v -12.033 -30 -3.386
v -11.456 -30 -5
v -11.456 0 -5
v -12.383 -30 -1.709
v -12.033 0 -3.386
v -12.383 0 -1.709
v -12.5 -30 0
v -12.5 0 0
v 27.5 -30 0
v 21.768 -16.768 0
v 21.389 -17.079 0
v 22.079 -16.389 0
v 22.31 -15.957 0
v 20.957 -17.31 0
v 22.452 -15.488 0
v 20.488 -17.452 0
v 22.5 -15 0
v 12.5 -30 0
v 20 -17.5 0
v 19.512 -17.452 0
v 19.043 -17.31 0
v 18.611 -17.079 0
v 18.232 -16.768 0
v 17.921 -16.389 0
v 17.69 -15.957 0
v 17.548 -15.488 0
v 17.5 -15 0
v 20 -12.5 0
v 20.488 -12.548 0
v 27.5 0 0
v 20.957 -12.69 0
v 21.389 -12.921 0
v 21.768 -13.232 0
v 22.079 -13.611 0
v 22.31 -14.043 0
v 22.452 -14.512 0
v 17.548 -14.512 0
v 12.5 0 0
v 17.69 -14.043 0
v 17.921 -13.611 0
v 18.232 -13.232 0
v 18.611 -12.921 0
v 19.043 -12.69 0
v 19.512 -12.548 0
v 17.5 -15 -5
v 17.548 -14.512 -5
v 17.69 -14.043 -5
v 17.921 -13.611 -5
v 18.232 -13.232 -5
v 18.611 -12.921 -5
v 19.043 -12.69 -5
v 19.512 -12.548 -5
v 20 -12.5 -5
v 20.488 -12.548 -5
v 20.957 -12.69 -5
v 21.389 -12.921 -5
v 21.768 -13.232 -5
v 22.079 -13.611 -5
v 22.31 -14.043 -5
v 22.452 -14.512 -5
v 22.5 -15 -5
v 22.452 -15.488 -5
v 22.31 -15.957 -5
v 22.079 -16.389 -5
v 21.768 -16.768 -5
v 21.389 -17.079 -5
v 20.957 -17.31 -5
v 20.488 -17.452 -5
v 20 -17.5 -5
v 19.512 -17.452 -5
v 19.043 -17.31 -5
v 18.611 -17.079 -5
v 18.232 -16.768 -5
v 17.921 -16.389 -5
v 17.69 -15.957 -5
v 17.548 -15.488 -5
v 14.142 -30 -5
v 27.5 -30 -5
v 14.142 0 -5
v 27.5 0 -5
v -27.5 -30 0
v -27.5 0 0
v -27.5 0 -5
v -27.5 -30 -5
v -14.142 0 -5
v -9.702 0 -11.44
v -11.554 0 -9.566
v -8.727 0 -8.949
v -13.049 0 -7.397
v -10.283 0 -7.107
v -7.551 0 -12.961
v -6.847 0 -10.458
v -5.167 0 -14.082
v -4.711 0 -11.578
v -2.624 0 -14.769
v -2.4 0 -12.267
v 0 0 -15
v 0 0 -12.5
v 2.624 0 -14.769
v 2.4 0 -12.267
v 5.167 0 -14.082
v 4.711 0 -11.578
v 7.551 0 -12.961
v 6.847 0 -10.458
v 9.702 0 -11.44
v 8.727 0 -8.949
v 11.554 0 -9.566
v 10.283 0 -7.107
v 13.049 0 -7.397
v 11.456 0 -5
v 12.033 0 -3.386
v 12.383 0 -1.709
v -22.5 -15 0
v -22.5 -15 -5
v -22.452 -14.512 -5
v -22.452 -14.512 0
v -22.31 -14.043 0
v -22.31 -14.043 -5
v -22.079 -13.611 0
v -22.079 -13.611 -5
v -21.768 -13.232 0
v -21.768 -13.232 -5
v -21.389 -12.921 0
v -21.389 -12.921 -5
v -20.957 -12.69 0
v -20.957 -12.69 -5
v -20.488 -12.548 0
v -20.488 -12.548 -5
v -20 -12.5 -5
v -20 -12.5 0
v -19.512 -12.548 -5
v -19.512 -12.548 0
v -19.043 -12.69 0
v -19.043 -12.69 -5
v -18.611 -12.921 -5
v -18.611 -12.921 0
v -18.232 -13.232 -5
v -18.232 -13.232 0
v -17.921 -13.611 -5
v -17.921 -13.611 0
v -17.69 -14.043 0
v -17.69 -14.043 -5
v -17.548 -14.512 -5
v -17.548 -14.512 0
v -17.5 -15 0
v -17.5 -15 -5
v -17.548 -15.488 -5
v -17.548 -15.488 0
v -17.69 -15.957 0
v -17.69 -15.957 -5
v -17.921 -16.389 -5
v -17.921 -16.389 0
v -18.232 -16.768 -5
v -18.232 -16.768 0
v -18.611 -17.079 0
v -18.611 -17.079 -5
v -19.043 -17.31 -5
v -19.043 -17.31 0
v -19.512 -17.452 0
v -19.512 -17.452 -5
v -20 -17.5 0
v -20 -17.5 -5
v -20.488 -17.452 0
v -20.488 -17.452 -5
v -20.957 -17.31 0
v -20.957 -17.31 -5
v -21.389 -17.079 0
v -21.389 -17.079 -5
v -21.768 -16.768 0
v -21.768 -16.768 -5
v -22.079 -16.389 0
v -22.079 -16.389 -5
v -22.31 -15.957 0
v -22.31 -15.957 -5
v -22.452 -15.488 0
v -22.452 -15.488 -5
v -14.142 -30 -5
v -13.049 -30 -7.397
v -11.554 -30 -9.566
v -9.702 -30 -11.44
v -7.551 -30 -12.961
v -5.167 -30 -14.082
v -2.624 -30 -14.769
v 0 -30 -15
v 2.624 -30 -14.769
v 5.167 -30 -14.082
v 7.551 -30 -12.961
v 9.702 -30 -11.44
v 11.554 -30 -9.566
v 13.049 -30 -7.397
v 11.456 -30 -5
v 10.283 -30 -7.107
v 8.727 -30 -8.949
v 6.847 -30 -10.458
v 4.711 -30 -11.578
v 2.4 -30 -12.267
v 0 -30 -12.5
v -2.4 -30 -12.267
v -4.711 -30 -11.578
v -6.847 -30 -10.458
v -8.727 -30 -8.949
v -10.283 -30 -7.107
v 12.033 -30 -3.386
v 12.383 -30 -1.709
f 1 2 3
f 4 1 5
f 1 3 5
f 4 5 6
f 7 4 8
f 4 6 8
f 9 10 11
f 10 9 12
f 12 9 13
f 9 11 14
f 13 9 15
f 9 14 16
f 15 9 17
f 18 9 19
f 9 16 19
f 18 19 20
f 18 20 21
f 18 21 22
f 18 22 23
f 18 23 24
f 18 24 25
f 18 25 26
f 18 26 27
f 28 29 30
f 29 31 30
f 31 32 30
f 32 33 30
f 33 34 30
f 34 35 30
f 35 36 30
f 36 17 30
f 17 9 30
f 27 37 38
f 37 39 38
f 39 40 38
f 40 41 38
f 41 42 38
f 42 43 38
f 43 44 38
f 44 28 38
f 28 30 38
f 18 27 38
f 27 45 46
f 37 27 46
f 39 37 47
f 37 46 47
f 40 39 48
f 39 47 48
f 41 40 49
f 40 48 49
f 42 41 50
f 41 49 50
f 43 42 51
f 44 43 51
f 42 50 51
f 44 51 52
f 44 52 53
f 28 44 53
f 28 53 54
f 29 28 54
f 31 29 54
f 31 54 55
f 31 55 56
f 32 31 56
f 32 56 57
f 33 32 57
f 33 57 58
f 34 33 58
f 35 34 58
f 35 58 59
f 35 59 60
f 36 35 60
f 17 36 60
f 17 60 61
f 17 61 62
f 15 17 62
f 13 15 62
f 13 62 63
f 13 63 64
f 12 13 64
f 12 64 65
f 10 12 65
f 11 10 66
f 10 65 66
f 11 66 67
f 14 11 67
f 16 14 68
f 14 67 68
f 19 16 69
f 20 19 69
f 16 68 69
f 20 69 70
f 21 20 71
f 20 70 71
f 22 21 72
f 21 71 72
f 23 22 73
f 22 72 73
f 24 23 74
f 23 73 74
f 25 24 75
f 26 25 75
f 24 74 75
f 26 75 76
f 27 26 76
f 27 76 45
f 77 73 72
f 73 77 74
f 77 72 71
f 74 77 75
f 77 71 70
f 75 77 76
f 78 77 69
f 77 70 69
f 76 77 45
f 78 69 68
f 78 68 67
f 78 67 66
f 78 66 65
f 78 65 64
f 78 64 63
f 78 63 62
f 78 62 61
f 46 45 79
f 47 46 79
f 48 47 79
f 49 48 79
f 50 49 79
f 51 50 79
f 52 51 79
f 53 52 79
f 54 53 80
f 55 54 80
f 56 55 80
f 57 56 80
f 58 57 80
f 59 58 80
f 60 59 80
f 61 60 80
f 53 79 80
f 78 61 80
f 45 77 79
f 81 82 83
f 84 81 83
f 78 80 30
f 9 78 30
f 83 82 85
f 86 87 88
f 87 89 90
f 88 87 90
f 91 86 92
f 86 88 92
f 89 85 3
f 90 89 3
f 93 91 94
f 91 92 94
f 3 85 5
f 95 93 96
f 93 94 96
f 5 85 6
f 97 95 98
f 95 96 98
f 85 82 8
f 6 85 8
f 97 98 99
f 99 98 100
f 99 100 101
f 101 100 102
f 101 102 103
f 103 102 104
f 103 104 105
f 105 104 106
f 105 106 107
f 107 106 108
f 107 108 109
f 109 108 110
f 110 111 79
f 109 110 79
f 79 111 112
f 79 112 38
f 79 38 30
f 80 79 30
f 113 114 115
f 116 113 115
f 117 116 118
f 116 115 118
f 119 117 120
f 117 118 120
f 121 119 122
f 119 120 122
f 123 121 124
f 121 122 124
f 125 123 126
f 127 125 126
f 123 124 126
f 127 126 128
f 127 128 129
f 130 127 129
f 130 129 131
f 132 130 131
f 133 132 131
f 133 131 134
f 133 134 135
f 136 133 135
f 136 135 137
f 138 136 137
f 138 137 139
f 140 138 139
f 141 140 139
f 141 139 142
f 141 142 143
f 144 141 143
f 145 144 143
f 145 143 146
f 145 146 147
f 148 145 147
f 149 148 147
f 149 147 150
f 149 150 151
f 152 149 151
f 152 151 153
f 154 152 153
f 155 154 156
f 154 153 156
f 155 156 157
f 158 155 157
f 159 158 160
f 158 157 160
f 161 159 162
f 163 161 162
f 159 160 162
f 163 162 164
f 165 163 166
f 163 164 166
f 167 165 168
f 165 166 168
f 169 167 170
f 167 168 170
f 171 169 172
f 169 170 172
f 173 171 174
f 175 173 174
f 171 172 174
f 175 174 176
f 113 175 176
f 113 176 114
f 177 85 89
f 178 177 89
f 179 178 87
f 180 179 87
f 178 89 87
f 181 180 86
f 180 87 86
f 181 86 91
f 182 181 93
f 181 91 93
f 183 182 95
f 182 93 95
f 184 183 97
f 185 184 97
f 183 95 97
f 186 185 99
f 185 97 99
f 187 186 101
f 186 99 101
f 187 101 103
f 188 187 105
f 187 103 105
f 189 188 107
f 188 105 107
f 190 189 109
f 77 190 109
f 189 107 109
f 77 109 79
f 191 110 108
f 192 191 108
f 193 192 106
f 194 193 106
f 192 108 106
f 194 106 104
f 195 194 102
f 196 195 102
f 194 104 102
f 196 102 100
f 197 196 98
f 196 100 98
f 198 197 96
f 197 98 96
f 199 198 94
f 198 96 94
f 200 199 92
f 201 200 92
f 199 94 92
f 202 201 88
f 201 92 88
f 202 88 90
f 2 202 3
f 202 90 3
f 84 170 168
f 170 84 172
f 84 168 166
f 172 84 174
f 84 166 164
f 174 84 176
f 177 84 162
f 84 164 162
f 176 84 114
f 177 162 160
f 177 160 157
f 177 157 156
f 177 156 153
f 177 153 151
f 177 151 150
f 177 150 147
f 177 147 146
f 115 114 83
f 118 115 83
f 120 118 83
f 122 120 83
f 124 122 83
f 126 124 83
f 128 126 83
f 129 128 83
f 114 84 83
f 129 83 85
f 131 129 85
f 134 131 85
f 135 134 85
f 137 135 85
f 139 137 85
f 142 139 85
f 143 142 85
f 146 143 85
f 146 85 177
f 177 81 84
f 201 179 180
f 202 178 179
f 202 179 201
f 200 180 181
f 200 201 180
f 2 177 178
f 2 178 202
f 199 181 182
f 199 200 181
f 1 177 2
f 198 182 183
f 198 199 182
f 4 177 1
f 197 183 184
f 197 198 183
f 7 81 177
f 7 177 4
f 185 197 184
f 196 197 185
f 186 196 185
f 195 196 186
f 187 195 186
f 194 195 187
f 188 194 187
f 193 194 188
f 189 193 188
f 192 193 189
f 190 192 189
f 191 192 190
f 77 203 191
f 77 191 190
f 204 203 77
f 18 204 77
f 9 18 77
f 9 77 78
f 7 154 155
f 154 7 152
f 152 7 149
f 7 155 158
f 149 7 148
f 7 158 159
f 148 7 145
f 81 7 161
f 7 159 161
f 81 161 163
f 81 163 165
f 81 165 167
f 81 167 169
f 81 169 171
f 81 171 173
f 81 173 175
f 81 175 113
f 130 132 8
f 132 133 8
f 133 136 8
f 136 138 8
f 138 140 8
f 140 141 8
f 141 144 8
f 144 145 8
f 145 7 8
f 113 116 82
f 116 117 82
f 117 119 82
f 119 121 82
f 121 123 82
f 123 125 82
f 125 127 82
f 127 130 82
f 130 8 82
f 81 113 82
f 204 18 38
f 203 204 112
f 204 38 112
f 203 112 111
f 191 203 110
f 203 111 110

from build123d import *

# Parameters (mm, degrees)
F1_DEPTH = 30
F3_D     = 5


with BuildPart() as f1:
    # F0 (on Front) → F1 (new body)
    with BuildSketch(Plane.XZ):
        with BuildLine():
            ThreePointArc((-14.1421356237, -5), (-14.7839783948, -2.5365296809), (-15, 0))
            Line((-15, 0), (-27.5, 0))
            Line((-27.5, 0), (-27.5, -5))
            Line((-27.5, -5), (-14.1421356237, -5))
        make_face()
        with BuildLine():
            ThreePointArc((-11.4564392374, -5), (-12.2363289116, -2.5538705461), (-12.5, 0))
            Line((-12.5, 0), (-15, 0))
            ThreePointArc((-15, 0), (-14.7839783948, -2.5365296809), (-14.1421356237, -5))
            Line((-14.1421356237, -5), (-11.4564392374, -5))
        make_face()
        with BuildLine():
            ThreePointArc((11.4564392374, -5), (0, -12.5), (-11.4564392374, -5))
            Line((-11.4564392374, -5), (-14.1421356237, -5))
            ThreePointArc((-14.1421356237, -5), (0, -15), (14.1421356237, -5))
            Line((14.1421356237, -5), (11.4564392374, -5))
        make_face()
        with BuildLine():
            ThreePointArc((12.5, 0), (12.2363289116, -2.5538705461), (11.4564392374, -5))
            Line((11.4564392374, -5), (14.1421356237, -5))
            ThreePointArc((14.1421356237, -5), (14.7839783948, -2.5365296809), (15, 0))
            Line((15, 0), (12.5, 0))
        make_face()
        with BuildLine():
            ThreePointArc((15, 0), (14.7839783948, -2.5365296809), (14.1421356237, -5))
            Line((14.1421356237, -5), (27.5, -5))
            Line((27.5, -5), (27.5, 0))
            Line((27.5, 0), (15, 0))
        make_face()
    extrude(amount=F1_DEPTH)

    # F3 (through all)
    with Locations(Plane.XY):
        with Locations((-20, -15), (20, -15)):
            Hole(F3_D / 2)


solid = f1.part
